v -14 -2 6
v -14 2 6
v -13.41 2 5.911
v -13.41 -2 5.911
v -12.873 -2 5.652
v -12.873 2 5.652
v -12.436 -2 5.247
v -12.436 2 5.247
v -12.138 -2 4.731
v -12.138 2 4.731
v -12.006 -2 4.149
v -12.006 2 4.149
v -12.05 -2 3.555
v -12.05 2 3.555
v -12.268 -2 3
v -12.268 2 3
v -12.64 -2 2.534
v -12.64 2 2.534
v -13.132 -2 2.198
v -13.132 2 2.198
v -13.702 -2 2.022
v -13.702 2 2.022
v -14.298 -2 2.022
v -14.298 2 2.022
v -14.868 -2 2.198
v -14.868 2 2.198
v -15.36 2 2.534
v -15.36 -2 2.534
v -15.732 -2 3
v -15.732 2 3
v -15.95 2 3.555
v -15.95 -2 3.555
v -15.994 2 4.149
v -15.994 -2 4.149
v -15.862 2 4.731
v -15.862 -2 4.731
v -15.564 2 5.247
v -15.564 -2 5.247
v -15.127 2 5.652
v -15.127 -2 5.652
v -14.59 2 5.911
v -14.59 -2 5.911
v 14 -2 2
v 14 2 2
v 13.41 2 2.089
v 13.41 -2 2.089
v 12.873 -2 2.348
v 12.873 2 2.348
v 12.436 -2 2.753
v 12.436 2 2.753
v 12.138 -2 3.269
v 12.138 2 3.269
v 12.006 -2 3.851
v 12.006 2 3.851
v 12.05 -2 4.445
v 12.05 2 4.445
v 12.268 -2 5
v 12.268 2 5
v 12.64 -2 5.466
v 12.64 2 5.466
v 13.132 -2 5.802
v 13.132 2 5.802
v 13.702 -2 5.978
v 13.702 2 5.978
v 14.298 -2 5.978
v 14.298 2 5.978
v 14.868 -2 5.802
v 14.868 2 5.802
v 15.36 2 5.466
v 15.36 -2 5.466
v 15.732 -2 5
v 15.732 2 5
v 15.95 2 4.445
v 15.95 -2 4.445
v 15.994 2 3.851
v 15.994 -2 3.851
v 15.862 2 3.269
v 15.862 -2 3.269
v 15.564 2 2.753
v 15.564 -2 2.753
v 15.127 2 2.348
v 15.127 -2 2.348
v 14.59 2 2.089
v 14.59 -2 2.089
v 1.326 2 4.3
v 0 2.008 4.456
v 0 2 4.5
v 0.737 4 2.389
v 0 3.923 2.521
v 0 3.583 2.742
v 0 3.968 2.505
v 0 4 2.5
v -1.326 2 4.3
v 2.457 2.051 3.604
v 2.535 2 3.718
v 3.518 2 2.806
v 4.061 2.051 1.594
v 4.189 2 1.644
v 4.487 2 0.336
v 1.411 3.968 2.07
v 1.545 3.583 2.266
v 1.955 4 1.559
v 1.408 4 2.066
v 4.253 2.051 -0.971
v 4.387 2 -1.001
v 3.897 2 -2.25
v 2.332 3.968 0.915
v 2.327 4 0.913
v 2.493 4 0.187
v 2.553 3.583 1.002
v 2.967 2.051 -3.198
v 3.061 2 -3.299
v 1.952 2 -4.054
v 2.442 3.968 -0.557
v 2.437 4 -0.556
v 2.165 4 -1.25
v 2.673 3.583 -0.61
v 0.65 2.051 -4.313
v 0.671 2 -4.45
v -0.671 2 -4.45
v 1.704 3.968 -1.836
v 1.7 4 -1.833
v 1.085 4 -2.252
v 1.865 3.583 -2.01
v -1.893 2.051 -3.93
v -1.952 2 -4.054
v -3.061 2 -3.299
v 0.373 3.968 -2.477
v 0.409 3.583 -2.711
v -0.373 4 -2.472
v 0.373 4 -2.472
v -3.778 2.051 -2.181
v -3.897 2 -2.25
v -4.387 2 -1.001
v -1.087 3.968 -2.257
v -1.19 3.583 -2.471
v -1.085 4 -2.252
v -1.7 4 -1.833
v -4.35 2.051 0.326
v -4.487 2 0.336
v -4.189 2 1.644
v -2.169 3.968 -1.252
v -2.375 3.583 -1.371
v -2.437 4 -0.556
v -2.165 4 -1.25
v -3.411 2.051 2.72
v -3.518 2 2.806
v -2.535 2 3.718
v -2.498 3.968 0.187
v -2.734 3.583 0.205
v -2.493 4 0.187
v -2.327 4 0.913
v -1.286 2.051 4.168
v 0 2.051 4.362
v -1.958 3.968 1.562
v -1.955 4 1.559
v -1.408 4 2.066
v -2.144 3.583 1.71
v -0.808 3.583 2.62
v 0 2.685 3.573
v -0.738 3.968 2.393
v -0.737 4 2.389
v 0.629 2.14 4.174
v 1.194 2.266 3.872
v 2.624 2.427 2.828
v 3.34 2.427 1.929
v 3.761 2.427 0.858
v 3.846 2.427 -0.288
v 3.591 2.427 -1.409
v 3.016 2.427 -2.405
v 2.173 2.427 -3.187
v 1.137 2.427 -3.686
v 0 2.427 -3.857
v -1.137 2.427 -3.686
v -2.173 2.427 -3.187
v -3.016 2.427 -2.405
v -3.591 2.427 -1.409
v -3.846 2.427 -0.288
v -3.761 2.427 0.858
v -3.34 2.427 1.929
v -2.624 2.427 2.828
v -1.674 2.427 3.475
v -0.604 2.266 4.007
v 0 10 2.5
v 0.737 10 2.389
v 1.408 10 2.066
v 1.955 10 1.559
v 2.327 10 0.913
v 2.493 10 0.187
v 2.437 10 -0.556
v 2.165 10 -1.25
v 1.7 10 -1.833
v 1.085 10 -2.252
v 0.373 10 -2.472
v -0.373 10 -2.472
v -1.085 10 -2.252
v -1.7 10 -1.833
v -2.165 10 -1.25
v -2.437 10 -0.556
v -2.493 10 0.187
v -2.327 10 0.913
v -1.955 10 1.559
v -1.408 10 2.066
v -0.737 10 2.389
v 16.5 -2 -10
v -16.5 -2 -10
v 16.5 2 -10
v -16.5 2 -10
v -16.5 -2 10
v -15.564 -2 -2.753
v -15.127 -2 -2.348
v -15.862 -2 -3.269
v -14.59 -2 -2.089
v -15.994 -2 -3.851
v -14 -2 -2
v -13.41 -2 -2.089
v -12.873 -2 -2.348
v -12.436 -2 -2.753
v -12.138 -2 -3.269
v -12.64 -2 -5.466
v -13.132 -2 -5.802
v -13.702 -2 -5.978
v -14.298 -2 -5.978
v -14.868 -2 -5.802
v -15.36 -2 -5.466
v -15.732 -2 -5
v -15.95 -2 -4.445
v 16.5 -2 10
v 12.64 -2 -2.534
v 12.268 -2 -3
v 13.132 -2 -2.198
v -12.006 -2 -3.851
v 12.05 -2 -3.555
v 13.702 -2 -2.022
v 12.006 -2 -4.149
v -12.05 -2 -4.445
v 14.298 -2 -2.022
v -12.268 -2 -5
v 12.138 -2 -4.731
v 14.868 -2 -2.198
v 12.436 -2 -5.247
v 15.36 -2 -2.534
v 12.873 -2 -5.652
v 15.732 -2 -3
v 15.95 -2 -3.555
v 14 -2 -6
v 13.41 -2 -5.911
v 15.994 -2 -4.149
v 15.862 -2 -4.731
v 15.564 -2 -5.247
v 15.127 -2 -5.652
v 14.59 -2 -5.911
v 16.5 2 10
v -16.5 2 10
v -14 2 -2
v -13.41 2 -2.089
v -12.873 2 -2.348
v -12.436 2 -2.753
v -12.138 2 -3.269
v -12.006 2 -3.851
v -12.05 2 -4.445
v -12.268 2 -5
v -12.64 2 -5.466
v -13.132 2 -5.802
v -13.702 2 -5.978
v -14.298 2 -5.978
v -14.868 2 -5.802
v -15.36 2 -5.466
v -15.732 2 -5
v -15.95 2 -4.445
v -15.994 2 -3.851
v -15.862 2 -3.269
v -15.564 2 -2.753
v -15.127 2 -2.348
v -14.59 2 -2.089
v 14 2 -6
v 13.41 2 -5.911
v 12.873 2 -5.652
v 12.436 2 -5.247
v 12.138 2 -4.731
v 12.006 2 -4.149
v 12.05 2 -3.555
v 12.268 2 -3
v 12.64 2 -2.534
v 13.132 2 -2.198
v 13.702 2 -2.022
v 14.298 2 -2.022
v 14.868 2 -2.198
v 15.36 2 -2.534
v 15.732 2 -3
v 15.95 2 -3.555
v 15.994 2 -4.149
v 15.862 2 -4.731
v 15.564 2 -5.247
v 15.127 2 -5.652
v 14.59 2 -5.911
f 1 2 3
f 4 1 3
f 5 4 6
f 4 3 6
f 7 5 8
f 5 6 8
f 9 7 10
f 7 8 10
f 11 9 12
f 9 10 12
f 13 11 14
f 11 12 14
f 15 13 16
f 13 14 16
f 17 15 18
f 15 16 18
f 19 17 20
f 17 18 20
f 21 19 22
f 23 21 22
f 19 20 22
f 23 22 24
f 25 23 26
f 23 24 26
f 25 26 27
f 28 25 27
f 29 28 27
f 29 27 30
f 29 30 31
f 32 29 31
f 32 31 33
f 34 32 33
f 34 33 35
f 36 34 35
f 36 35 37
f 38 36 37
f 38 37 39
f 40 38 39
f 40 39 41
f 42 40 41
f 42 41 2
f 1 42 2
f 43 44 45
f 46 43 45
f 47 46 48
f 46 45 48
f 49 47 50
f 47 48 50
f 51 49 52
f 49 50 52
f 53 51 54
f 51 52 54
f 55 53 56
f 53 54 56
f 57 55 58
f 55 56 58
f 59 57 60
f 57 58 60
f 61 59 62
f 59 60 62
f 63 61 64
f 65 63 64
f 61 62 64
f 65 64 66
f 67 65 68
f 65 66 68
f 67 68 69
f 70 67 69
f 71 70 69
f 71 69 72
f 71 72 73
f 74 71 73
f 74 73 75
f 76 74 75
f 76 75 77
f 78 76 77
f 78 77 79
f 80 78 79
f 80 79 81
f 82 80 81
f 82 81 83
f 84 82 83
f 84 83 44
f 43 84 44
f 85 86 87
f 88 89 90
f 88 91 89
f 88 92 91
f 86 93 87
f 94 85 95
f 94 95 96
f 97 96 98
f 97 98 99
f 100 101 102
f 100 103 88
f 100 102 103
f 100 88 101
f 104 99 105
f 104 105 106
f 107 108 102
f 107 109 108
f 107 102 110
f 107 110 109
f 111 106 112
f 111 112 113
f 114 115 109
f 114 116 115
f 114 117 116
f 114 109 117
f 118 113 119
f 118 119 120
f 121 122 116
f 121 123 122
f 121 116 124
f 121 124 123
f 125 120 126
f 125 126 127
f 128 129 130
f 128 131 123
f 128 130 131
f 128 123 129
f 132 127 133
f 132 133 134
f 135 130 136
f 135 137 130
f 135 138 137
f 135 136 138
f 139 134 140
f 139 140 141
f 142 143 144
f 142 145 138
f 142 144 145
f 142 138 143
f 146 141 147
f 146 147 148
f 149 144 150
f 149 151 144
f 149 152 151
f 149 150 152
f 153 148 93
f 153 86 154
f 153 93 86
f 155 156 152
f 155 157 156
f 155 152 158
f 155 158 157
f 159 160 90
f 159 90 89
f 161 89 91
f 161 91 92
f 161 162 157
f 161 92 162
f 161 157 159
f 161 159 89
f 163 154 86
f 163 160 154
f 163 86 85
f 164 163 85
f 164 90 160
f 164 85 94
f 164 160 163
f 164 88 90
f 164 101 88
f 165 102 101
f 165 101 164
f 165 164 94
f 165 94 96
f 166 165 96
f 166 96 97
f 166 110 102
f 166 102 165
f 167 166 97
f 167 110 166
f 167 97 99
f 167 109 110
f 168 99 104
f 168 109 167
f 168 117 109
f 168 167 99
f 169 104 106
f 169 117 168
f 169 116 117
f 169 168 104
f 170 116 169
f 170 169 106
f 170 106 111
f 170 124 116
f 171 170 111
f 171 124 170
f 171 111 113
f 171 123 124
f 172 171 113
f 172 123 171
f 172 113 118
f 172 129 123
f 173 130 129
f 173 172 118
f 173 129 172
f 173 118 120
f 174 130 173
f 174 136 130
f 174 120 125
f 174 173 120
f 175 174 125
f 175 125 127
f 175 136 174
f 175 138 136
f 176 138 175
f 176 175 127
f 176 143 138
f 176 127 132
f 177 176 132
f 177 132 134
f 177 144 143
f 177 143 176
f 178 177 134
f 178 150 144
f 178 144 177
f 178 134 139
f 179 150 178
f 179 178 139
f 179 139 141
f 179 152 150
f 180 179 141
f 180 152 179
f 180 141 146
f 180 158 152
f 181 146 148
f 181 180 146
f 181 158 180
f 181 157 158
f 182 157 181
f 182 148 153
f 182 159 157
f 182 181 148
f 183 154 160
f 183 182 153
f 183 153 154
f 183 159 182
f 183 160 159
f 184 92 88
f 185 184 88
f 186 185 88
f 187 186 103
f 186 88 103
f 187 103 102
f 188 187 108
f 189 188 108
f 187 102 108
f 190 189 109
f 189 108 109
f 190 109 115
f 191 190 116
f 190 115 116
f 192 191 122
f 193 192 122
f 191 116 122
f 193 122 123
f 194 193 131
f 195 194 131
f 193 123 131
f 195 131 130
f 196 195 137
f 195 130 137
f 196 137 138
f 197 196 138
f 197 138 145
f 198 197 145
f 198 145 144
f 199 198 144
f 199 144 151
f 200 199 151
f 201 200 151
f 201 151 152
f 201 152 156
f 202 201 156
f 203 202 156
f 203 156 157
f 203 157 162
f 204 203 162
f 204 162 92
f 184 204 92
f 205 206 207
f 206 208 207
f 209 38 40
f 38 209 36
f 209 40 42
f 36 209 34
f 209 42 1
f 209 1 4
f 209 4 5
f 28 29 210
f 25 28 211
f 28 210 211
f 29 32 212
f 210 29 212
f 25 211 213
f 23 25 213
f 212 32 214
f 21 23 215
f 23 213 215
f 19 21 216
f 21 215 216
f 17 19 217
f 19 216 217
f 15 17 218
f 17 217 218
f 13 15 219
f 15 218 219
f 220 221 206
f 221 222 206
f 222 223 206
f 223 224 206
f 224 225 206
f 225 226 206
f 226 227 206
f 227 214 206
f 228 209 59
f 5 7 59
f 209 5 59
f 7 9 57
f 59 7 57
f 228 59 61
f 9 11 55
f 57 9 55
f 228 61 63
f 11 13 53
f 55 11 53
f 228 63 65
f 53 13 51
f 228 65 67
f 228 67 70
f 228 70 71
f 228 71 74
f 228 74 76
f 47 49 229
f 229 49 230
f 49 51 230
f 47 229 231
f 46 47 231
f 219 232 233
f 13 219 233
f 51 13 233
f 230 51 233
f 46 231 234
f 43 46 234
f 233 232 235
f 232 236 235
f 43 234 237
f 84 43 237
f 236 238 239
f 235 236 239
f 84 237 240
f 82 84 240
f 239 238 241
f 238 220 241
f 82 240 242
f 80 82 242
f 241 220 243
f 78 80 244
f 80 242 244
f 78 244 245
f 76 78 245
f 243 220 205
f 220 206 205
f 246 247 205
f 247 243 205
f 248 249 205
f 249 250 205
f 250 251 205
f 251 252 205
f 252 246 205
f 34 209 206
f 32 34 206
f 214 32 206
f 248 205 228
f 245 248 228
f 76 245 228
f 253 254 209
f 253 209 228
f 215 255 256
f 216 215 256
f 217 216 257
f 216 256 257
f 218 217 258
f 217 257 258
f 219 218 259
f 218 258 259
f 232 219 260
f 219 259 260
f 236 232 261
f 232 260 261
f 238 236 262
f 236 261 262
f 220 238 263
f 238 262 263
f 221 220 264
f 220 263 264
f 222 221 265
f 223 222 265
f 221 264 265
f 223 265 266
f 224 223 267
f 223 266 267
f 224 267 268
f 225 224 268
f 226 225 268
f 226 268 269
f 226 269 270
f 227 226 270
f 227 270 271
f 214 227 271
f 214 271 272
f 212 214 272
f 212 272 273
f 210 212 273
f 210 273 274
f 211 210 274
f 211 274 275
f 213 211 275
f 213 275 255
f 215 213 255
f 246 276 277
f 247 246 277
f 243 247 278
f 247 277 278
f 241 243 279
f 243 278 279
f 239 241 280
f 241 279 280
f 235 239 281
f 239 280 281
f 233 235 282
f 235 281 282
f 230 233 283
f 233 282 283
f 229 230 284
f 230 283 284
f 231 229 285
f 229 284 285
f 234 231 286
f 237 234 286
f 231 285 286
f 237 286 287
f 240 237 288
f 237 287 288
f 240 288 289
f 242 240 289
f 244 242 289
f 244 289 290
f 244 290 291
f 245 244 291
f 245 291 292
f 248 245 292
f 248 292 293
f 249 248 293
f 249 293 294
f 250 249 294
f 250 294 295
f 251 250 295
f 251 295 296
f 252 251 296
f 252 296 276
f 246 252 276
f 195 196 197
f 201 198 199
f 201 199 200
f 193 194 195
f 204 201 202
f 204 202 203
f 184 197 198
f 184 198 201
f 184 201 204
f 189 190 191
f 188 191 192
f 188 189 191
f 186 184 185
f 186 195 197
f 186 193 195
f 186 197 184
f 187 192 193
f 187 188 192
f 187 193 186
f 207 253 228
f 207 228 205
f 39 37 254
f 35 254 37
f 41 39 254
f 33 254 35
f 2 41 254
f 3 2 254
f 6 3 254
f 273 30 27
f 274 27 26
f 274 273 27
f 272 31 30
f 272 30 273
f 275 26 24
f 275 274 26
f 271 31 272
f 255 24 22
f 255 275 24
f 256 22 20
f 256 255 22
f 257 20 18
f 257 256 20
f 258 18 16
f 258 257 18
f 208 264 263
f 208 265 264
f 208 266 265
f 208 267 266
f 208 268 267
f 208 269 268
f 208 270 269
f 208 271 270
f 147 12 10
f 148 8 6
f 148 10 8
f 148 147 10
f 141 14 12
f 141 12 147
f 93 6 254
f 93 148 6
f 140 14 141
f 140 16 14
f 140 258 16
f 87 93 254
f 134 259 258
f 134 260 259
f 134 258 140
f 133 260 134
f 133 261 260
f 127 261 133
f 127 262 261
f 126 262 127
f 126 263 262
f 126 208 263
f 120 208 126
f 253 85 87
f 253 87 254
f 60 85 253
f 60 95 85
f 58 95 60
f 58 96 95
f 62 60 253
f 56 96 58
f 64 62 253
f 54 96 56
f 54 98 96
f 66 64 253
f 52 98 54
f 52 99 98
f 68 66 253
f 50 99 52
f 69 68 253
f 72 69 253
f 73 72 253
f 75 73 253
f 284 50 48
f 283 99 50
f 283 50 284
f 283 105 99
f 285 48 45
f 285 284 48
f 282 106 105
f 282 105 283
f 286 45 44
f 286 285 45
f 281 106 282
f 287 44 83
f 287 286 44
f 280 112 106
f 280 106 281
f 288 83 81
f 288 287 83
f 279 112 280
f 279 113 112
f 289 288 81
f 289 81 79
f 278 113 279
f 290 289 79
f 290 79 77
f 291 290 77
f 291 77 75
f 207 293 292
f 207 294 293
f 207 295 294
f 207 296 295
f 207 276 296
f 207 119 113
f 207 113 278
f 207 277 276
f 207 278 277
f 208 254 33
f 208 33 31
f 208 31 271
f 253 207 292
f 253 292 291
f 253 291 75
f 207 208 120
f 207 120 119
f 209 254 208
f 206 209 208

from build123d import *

# Parameters (mm, degrees)
SKETCH1_W           = 33
SKETCH1_H           = 20
BOSS_EXTRUDE1_DEPTH = 2
SKETCH2_R           = 2
CUT_EXTRUDE1_DEPTH  = 20.704060495
SKETCH3_R           = 2.5
BOSS_EXTRUDE2_DEPTH = 8
FILLET1_SIZE        = 2


with BuildPart() as part:
    # Sketch1 → Boss-Extrude1 (new, symmetric)
    with BuildSketch(Plane(origin=(0, 0, 0), x_dir=(1, 0, 0), z_dir=(0, 1, 0))):
        Rectangle(SKETCH1_W, SKETCH1_H)
    extrude(amount=BOSS_EXTRUDE1_DEPTH, both=True)

    # Sketch2 → Cut-Extrude1 (cut, through all)
    with BuildSketch(Plane(origin=(0, 2, 0), x_dir=(1, 0, 0), z_dir=(0, 1, 0))):
        with Locations(Location((-14, 4, 0), (0, 0, 270))):
            Circle(SKETCH2_R)
        with Locations(Location((-14, -4, 0), (0, 0, 270))):
            Circle(SKETCH2_R)
        with Locations(Location((14, -4, 0), (0, 0, 90))):
            Circle(SKETCH2_R)
        with Locations(Location((14, 4, 0), (0, 0, 90))):
            Circle(SKETCH2_R)
    extrude(amount=-CUT_EXTRUDE1_DEPTH, mode=Mode.SUBTRACT)

    # Sketch3 → Boss-Extrude2 (add)
    with BuildSketch(Plane(origin=(0, 2, 0), x_dir=(1, 0, 0), z_dir=(0, 1, 0))):
        with Locations(Location((0, 0, 0), (0, 0, 270))):
            Circle(SKETCH3_R)
    extrude(amount=BOSS_EXTRUDE2_DEPTH)

    # Fillet1
    # a fillet whose section is not a circle: 2 mm, written as the material it adds along each edge
    with BuildSketch(Plane(origin=(0, 2, 0), x_dir=(0, 0, 1), z_dir=(-1, 0, 0))) as fillet1_piece_1:
        with BuildLine():
            Bezier((2.5 + FILLET1_SIZE, 0), (2.5, 0), (2.5, FILLET1_SIZE), weights=[1, 0.141421356, 1])
            Line((2.5, FILLET1_SIZE), (2.5, 0))
            Line((2.5, 0), (2.5 + FILLET1_SIZE, 0))
        make_face()
    revolve(axis=Axis((0, 2, 0), (0, 1, 0)))


solid = part.part
